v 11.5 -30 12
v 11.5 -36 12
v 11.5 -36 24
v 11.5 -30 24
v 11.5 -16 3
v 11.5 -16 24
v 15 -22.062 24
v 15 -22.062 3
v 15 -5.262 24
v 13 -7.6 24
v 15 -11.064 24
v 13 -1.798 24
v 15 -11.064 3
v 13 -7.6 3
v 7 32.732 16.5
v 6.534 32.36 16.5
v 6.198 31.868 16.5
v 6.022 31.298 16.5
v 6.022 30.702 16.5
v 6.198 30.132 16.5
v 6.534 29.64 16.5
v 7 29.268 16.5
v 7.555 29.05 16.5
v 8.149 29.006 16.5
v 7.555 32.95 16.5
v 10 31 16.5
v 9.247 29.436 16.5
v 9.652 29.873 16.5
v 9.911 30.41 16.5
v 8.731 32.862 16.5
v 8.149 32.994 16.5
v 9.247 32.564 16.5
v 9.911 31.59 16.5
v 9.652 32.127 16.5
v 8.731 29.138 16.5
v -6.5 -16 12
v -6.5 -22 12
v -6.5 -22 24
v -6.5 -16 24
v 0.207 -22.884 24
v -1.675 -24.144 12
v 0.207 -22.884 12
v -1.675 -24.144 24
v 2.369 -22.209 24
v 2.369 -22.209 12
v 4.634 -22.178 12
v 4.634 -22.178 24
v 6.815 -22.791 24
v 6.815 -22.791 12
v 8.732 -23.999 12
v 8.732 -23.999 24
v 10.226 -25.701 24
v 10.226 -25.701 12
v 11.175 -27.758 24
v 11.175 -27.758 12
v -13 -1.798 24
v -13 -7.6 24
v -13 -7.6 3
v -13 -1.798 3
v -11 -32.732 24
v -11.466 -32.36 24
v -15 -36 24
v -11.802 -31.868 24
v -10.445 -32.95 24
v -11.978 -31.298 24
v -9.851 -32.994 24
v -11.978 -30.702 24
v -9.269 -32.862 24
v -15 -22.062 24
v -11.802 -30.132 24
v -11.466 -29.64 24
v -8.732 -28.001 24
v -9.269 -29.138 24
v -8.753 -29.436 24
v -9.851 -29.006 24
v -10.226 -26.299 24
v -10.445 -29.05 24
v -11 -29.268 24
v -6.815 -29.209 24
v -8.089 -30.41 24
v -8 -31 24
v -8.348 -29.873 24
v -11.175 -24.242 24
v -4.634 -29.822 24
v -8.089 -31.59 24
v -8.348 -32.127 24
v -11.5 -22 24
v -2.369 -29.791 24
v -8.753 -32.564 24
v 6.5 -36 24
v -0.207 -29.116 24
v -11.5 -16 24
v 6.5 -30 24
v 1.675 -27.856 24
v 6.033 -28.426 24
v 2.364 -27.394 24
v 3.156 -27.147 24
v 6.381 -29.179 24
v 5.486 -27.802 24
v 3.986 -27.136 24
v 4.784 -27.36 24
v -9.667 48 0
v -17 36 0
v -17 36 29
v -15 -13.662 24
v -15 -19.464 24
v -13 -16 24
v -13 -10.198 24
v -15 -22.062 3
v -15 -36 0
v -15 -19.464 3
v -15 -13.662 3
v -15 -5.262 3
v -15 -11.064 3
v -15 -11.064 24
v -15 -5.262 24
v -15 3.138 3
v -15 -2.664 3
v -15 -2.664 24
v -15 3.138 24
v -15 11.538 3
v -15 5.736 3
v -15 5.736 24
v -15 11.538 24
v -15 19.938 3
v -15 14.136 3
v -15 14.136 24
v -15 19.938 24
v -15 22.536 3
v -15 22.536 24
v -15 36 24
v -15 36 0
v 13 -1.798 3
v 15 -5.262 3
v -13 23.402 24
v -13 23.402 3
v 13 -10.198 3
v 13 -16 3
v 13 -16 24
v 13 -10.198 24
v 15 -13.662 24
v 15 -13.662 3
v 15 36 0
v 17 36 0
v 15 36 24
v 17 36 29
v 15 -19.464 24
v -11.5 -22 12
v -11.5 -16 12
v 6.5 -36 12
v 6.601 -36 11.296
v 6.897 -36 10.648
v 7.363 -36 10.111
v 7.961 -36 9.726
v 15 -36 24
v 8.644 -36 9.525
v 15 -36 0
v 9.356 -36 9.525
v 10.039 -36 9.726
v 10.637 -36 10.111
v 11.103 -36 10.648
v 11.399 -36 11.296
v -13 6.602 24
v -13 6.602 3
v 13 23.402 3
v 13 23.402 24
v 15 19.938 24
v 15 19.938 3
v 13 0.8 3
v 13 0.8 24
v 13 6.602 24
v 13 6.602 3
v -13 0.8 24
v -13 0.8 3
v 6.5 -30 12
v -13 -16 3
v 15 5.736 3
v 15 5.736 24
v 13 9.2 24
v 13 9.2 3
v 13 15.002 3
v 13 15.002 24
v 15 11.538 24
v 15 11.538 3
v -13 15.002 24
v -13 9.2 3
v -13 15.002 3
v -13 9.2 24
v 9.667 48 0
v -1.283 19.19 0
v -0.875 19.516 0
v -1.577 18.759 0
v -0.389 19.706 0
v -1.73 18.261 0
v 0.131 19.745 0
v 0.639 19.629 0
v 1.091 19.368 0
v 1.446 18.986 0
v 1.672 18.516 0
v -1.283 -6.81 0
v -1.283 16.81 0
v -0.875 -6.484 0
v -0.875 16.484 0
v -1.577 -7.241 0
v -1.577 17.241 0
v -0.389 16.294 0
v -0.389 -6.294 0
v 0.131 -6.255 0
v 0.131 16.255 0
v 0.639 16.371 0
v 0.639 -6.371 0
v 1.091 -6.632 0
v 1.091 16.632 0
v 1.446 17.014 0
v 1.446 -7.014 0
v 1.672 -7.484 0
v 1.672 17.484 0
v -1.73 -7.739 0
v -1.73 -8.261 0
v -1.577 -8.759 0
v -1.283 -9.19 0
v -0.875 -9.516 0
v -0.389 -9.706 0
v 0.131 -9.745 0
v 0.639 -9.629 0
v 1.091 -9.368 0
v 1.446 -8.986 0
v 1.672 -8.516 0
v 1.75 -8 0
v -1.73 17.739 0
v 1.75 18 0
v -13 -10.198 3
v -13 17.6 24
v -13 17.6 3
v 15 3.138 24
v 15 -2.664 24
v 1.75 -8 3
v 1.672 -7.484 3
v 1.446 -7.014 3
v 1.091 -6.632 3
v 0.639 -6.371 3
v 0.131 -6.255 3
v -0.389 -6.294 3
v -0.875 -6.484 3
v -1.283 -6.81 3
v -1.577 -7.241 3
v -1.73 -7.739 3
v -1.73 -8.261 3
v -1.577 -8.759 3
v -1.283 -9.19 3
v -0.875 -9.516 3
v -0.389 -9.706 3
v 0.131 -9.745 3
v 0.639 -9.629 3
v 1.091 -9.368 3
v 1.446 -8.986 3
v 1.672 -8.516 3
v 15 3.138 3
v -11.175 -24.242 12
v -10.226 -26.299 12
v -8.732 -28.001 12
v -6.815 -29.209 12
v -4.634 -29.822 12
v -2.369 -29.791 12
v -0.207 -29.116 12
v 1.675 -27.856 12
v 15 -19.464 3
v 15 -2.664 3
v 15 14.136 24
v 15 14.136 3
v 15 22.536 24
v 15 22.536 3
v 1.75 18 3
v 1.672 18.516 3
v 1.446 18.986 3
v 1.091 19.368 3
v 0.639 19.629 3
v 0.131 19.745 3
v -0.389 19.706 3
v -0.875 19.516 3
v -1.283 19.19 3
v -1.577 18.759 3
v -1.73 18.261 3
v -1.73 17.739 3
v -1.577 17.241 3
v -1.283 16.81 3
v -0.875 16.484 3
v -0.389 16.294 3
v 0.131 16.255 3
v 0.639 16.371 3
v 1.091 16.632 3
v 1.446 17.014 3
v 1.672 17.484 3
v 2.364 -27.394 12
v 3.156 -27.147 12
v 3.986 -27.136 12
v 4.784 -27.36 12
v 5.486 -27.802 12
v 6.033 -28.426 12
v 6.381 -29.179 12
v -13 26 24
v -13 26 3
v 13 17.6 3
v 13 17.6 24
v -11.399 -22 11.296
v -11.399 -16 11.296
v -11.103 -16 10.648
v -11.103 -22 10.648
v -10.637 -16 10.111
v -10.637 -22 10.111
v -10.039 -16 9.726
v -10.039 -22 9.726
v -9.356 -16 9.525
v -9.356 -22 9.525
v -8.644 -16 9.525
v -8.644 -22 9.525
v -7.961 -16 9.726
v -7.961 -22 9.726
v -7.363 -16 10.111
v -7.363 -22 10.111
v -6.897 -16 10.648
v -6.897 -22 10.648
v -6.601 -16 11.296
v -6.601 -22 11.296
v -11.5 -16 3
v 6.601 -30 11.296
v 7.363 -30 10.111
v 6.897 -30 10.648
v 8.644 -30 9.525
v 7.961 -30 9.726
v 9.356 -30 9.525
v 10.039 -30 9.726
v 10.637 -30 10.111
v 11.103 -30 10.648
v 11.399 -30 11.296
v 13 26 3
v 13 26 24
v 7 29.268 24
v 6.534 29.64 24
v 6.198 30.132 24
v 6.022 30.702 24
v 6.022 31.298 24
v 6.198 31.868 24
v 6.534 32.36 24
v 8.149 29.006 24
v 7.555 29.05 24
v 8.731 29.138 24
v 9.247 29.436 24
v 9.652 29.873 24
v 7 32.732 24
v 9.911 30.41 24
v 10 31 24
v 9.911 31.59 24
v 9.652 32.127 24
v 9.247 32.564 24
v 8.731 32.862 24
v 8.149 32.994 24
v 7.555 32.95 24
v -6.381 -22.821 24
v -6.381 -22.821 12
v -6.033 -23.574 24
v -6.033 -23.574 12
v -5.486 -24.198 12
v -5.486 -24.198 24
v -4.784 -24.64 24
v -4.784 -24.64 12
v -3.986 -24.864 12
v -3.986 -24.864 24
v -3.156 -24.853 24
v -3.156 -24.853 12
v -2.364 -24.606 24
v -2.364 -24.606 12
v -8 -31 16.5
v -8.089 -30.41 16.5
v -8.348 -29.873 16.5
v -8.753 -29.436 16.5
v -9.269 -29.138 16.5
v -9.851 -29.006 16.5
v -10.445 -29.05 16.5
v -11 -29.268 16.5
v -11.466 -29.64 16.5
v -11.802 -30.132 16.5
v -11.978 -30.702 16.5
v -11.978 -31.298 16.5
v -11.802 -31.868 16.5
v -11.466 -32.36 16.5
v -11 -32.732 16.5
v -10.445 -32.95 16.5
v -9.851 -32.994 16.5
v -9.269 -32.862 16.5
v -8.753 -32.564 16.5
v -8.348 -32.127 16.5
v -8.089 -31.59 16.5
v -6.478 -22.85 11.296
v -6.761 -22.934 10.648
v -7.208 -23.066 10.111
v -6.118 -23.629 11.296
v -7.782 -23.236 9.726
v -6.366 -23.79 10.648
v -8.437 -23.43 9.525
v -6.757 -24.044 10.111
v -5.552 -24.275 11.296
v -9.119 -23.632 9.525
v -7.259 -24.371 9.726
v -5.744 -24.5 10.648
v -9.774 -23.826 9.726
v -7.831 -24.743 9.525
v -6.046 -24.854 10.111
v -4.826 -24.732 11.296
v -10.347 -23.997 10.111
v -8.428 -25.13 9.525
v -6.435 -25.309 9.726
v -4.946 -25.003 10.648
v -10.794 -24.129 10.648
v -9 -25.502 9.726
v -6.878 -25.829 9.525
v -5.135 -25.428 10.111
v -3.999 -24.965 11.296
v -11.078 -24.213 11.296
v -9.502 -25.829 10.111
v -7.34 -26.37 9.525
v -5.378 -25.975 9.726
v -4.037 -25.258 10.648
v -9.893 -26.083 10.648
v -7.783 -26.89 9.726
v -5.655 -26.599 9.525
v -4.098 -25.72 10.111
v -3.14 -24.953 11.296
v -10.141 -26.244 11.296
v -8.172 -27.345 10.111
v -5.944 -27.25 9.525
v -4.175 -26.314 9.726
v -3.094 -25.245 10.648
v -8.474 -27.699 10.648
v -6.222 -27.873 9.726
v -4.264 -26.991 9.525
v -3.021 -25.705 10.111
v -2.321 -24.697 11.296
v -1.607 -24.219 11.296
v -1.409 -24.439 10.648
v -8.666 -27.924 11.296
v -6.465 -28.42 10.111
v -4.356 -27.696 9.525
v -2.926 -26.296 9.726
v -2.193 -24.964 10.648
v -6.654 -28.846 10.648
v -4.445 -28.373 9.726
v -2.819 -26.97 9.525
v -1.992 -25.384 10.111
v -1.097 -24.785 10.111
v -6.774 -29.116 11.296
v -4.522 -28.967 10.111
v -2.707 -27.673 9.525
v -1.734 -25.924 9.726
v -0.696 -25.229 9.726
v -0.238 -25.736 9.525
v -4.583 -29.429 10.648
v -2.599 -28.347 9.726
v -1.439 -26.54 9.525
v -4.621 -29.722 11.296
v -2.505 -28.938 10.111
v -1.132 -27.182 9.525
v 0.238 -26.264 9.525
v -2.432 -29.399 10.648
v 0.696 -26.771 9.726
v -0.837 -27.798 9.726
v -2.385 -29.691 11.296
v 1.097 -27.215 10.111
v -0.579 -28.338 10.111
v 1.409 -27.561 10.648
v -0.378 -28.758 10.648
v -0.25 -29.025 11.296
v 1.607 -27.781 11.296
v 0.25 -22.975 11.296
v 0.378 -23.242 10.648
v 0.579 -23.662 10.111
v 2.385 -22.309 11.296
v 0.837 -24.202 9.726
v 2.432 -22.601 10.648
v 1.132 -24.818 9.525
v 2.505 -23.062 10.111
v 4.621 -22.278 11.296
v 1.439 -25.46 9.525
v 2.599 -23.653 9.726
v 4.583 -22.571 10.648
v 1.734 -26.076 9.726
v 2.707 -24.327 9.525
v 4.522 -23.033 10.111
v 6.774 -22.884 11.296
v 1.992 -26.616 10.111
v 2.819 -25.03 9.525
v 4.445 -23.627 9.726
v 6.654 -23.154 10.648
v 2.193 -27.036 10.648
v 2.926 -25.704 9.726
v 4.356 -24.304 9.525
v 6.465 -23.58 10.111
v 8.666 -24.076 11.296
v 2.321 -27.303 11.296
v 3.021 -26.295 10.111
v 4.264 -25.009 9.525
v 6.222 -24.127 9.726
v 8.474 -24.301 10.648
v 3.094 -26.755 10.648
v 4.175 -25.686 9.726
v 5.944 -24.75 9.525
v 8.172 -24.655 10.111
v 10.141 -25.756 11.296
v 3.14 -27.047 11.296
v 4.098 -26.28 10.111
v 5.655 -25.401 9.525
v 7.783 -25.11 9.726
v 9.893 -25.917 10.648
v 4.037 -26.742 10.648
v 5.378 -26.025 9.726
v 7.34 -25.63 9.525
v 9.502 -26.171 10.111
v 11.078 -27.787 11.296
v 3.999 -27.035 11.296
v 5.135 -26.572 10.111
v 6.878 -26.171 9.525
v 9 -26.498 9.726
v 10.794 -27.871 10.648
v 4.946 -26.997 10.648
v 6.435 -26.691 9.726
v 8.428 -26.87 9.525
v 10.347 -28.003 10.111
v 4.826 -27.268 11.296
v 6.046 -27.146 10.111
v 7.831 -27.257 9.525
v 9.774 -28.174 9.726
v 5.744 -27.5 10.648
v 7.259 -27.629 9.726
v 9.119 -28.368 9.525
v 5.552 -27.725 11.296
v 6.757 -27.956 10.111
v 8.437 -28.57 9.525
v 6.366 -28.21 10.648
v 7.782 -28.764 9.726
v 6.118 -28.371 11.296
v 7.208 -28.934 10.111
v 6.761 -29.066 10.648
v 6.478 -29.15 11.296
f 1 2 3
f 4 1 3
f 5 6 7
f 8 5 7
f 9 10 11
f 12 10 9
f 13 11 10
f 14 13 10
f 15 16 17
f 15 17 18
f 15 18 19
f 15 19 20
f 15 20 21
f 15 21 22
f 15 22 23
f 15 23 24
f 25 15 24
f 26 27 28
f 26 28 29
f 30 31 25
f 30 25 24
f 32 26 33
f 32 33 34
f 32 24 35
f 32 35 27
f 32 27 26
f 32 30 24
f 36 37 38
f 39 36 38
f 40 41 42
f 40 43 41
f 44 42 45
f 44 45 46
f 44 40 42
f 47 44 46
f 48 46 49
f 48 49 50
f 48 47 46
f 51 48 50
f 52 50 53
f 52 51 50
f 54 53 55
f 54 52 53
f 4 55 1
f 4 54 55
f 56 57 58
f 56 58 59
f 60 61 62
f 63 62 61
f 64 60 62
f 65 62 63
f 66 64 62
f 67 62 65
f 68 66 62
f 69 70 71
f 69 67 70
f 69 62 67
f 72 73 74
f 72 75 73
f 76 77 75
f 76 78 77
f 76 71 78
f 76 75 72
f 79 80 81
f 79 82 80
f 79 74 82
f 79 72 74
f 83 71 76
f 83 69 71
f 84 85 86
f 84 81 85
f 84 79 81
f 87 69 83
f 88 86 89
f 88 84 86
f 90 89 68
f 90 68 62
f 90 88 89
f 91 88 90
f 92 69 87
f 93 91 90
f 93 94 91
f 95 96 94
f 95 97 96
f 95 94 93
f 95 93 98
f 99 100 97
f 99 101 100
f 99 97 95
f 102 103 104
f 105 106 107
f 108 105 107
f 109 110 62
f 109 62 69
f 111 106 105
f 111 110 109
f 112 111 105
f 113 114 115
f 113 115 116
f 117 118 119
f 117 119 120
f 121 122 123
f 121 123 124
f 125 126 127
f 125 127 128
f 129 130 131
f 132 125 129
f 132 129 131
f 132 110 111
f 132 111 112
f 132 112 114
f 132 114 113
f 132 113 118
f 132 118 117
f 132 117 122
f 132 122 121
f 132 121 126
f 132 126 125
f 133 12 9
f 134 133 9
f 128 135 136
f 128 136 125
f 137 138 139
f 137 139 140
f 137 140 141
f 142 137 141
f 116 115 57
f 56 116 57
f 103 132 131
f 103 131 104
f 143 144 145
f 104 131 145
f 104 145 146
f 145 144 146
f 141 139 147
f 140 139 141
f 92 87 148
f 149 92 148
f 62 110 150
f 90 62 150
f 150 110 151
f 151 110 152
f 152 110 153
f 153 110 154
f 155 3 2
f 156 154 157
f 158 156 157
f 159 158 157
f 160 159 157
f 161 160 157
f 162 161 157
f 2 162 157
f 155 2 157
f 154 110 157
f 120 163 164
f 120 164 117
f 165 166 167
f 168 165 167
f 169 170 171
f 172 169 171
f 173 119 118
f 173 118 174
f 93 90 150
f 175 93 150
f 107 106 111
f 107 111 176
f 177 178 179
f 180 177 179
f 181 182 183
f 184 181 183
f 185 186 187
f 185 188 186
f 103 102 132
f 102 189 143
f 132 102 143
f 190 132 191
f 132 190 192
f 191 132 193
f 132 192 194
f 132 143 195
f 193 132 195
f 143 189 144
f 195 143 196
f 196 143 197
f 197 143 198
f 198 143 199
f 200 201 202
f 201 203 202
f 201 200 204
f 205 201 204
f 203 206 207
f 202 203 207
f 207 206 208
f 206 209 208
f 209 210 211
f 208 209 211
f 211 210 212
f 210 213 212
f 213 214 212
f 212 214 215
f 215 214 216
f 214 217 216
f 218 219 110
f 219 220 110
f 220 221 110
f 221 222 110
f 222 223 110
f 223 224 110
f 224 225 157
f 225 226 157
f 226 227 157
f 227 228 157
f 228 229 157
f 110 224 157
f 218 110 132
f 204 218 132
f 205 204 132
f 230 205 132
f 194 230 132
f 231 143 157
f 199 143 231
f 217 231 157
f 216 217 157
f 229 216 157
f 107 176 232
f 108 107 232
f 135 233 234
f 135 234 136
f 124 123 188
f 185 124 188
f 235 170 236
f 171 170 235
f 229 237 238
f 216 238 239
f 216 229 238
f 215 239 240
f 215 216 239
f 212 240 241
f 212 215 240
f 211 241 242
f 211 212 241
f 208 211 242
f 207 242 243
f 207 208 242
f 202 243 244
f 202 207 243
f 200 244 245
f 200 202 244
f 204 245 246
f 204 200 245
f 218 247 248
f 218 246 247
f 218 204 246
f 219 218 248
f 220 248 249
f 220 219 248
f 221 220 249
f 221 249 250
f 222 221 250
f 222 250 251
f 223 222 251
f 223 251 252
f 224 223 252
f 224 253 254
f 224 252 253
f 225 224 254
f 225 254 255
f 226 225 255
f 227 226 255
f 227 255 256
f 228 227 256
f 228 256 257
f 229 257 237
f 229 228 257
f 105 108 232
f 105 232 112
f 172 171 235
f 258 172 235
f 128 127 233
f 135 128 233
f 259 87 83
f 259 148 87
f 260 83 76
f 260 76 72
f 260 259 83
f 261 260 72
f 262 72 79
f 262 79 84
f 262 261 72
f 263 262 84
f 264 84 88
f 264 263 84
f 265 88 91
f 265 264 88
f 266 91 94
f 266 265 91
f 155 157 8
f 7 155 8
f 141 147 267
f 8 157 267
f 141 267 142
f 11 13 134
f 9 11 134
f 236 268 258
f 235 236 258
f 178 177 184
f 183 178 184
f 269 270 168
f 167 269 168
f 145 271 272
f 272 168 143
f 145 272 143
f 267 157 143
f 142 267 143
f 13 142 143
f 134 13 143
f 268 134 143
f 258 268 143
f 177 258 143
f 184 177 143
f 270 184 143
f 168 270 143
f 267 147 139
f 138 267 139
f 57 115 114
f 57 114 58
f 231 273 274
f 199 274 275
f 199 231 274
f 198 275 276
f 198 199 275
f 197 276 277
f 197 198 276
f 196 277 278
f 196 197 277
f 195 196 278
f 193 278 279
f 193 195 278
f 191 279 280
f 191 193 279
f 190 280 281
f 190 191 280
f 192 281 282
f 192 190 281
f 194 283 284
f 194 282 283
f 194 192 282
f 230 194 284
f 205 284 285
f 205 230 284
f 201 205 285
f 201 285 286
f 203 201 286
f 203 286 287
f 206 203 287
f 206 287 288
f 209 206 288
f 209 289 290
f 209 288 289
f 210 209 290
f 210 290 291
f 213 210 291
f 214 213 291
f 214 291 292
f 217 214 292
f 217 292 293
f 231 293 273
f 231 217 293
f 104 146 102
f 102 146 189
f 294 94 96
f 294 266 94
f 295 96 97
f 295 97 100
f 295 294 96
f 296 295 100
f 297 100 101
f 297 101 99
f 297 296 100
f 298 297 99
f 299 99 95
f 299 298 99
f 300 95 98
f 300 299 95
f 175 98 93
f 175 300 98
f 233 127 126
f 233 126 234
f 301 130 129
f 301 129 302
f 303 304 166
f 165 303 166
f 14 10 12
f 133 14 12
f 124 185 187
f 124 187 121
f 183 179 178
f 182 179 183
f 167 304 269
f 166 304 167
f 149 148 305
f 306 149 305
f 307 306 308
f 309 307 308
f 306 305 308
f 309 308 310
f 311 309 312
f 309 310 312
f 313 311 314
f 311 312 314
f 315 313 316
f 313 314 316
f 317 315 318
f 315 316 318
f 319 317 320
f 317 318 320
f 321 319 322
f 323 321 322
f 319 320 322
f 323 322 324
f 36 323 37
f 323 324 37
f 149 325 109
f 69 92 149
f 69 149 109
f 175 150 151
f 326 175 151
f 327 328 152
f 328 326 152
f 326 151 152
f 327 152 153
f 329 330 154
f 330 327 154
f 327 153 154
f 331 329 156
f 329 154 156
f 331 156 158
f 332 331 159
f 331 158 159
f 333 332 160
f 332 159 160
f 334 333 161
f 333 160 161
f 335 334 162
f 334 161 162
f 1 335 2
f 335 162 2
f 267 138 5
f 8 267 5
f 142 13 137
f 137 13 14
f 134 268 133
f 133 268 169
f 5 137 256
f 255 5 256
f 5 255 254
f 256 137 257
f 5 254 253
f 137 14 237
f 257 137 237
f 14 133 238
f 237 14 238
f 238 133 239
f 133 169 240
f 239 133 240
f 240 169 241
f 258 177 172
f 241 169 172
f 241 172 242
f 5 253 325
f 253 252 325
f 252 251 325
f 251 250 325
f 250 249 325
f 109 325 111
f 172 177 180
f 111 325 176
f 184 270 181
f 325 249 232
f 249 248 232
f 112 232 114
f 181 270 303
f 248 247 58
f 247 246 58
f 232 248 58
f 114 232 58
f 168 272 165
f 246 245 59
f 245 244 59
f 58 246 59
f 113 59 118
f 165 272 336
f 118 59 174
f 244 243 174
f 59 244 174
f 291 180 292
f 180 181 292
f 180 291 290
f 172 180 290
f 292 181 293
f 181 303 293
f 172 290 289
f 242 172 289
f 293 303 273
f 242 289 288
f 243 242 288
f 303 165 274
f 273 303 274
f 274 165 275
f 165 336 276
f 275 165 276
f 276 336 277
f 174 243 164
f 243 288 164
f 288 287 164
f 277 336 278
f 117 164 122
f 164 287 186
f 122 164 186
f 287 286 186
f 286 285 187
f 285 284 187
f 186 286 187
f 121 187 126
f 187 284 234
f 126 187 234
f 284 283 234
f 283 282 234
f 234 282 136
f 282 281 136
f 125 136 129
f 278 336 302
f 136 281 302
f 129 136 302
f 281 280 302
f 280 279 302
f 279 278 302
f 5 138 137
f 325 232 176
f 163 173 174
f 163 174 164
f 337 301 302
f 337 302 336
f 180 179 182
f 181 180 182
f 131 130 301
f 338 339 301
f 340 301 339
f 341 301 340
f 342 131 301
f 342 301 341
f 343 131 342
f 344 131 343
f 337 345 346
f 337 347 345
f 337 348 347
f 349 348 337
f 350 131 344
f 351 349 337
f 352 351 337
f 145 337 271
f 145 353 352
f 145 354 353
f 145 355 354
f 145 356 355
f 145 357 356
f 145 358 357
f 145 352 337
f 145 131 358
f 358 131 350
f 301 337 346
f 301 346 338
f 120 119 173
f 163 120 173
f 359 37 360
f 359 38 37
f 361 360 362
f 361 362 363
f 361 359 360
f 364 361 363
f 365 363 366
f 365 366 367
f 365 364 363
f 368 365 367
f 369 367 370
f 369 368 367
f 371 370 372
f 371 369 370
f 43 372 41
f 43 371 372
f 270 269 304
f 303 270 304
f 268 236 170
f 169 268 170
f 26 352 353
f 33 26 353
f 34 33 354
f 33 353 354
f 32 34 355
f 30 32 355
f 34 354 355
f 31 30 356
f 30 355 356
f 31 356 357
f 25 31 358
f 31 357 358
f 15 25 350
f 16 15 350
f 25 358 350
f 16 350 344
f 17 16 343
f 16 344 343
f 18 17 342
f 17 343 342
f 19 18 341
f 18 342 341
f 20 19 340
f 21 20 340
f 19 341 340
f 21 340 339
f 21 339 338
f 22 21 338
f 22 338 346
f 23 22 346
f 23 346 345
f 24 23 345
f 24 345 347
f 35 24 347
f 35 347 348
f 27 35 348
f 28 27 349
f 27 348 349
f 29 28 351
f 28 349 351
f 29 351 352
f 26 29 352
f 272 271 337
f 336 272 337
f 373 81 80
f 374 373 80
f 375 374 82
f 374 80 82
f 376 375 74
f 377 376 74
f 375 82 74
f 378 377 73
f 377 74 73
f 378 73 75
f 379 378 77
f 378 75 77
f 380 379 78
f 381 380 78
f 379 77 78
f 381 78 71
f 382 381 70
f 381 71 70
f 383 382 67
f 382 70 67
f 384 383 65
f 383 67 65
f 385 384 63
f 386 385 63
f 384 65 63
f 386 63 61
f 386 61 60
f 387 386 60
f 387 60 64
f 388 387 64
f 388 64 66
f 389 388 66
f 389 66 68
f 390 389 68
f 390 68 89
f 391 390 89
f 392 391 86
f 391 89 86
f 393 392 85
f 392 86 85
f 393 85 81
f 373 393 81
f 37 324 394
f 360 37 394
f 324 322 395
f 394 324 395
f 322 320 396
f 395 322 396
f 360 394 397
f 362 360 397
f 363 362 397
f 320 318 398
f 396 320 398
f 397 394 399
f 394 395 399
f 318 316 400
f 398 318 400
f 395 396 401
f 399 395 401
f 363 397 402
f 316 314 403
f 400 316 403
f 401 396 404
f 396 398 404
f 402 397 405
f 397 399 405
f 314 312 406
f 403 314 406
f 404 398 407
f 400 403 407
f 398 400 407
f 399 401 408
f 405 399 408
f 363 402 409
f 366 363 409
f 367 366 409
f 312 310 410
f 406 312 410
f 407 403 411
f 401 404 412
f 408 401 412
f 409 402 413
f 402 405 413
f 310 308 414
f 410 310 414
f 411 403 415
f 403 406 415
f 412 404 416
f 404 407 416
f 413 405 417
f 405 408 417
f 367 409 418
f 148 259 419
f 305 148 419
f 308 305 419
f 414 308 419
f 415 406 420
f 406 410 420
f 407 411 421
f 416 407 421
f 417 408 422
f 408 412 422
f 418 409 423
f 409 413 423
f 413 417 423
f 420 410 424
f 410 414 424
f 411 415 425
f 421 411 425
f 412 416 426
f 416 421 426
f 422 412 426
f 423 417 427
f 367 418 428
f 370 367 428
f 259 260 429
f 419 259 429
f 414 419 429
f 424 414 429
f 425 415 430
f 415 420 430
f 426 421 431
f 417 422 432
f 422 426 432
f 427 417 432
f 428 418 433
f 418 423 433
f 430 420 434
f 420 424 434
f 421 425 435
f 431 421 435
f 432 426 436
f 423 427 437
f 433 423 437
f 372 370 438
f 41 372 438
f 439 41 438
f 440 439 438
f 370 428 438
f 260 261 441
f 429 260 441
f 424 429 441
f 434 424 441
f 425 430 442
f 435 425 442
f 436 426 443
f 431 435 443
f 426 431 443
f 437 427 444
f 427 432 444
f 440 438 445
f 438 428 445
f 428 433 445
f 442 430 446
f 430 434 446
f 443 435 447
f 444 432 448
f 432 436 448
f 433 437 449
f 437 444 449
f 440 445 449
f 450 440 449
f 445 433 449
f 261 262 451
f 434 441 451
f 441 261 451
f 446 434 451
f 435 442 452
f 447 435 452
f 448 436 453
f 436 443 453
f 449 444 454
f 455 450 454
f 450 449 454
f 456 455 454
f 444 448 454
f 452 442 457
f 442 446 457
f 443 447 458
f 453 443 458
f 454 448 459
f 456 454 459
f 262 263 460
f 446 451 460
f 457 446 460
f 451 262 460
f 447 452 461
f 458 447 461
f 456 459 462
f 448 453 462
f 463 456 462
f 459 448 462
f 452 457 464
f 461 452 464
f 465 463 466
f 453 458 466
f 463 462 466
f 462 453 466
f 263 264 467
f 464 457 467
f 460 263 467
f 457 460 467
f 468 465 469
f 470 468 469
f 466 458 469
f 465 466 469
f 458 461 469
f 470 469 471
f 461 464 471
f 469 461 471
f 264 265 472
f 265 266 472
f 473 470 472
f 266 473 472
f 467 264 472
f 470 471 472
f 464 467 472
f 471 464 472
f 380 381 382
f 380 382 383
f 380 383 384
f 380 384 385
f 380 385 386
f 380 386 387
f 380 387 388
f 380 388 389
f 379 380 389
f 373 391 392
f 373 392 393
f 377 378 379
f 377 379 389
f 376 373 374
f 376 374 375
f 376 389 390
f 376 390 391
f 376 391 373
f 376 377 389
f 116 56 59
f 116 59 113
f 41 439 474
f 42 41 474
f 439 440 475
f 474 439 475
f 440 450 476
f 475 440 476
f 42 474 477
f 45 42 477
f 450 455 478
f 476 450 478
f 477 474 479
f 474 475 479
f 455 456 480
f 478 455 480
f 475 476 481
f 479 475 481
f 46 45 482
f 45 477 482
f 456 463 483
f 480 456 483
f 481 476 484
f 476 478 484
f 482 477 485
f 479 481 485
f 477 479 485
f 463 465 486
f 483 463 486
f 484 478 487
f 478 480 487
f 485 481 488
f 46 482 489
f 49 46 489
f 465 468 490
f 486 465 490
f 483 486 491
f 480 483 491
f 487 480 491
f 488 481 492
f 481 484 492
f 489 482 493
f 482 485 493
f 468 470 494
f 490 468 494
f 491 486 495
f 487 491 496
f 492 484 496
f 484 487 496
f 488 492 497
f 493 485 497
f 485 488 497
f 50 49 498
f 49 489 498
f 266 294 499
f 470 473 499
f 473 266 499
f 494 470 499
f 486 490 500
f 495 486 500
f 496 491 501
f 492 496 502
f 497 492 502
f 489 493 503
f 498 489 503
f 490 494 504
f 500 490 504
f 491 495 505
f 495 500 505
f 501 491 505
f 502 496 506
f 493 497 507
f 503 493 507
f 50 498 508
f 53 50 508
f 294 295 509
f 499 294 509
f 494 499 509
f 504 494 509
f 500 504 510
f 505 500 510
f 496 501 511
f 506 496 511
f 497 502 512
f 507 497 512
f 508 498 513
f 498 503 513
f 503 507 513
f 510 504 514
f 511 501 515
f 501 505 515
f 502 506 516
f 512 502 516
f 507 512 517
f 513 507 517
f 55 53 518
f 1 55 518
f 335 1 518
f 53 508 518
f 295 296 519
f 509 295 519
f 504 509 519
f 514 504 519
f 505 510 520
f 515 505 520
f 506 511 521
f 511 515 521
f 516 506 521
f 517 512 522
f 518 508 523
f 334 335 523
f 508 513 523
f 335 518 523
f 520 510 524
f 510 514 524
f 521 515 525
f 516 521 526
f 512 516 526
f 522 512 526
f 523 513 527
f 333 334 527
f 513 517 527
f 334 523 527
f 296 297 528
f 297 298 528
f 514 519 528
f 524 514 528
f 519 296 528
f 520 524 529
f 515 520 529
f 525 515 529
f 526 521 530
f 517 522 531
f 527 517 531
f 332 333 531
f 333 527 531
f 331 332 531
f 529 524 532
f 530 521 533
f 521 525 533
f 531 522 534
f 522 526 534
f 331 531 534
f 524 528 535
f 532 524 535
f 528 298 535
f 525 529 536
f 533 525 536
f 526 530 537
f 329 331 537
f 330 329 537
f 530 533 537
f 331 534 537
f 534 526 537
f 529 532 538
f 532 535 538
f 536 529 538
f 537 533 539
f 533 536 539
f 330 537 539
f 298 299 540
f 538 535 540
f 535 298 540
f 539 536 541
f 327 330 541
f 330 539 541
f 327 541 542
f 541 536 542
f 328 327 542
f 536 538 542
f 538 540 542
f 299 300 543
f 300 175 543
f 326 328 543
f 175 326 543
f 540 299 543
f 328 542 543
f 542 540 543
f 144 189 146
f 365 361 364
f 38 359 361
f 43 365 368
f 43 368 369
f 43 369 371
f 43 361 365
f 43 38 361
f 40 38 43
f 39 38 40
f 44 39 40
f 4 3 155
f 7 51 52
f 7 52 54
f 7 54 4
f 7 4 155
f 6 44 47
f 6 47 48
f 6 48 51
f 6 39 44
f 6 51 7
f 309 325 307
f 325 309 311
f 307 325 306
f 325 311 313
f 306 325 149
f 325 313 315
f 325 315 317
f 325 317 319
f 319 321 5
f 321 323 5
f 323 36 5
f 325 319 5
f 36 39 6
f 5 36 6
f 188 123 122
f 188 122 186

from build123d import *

# Parameters (mm, degrees)
SKETCH_W                        = 30
SKETCH_H                        = 72
SKETCH_R                        = 1.75
PAD_DEPTH                       = 24
SKETCH001_W                     = 26
SKETCH001_H                     = 42
POCKET_DEPTH                    = 21
POCKET001_DEPTH                 = 21
POCKET001_LINEARPATTERN_2_DEPTH = 21
POCKET001_LINEARPATTERN_3_DEPTH = 21
POCKET001_LINEARPATTERN_4_DEPTH = 21
POCKET001_LINEARPATTERN_5_DEPTH = 21
POCKET001_LINEARPATTERN_6_DEPTH = 21
SKETCH005_R                     = 2
POCKET002_DEPTH                 = 7.5
PAD003_DEPTH                    = 17
PAD003_DEPTH_BACK               = 17
POCKET004_DEPTH                 = 29.001


with BuildPart() as part:
    # Sketch → Pad (new body)
    with BuildSketch(Plane.XY):
        Rectangle(SKETCH_W, SKETCH_H)
        with Locations((0, 18)):
            Circle(SKETCH_R, mode=Mode.SUBTRACT)
        with Locations((0, -8)):
            Circle(SKETCH_R, mode=Mode.SUBTRACT)
    extrude(amount=PAD_DEPTH)

    # Sketch001 → Pocket (cut)
    with BuildSketch(Plane.XY.offset(24)):
        with Locations((0, 5)):
            Rectangle(SKETCH001_W, SKETCH001_H)
    extrude(amount=-POCKET_DEPTH, mode=Mode.SUBTRACT)

    # Sketch002 → Pocket001 (cut)
    with BuildSketch(Plane.XY.offset(24)):
        Polygon((-18.773503, 16), (-13, 26), (-11.5, 26), (-17.273503, 16), align=None)
    pocket001 = extrude(amount=-POCKET001_DEPTH, mode=Mode.SUBTRACT)

    # Sketch002 LinearPattern 2 → Pocket001 LinearPattern 2 (cut)
    with BuildSketch(Plane(origin=(0, -8.4, 24), x_dir=(1, 0, 0), z_dir=(0, 0, 1))):
        Polygon((-18.773503, 16), (-13, 26), (-11.5, 26), (-17.273503, 16), align=None)
    pocket001_linearpattern_2 = extrude(amount=-POCKET001_LINEARPATTERN_2_DEPTH, mode=Mode.SUBTRACT)

    # Sketch002 LinearPattern 3 → Pocket001 LinearPattern 3 (cut)
    with BuildSketch(Plane(origin=(0, -16.8, 24), x_dir=(1, 0, 0), z_dir=(0, 0, 1))):
        Polygon((-18.773503, 16), (-13, 26), (-11.5, 26), (-17.273503, 16), align=None)
    pocket001_linearpattern_3 = extrude(amount=-POCKET001_LINEARPATTERN_3_DEPTH, mode=Mode.SUBTRACT)

    # Sketch002 LinearPattern 4 → Pocket001 LinearPattern 4 (cut)
    with BuildSketch(Plane(origin=(0, -25.2, 24), x_dir=(1, 0, 0), z_dir=(0, 0, 1))):
        Polygon((-18.773503, 16), (-13, 26), (-11.5, 26), (-17.273503, 16), align=None)
    pocket001_linearpattern_4 = extrude(amount=-POCKET001_LINEARPATTERN_4_DEPTH, mode=Mode.SUBTRACT)

    # Sketch002 LinearPattern 5 → Pocket001 LinearPattern 5 (cut)
    with BuildSketch(Plane(origin=(0, -33.6, 24), x_dir=(1, 0, 0), z_dir=(0, 0, 1))):
        Polygon((-18.773503, 16), (-13, 26), (-11.5, 26), (-17.273503, 16), align=None)
    pocket001_linearpattern_5 = extrude(amount=-POCKET001_LINEARPATTERN_5_DEPTH, mode=Mode.SUBTRACT)

    # Sketch002 LinearPattern 6 → Pocket001 LinearPattern 6 (cut)
    with BuildSketch(Plane(origin=(0, -42, 24), x_dir=(1, 0, 0), z_dir=(0, 0, 1))):
        Polygon((-18.773503, 16), (-13, 26), (-11.5, 26), (-17.273503, 16), align=None)
    pocket001_linearpattern_6 = extrude(amount=-POCKET001_LINEARPATTERN_6_DEPTH, mode=Mode.SUBTRACT)

    # Mirrored: Pocket001, Pocket001 LinearPattern 2, Pocket001 LinearPattern 3, Pocket001 LinearPattern 4, Pocket001 LinearPattern 5, Pocket001 LinearPattern 6 across Sketch002 V_Axis
    add(pocket001.mirror(Plane(origin=(0, 0, 24), x_dir=(0, 0, 1), z_dir=(1, 0, 0))), mode=Mode.SUBTRACT)
    add(pocket001_linearpattern_2.mirror(Plane(origin=(0, 0, 24), x_dir=(0, 0, 1), z_dir=(1, 0, 0))), mode=Mode.SUBTRACT)
    add(pocket001_linearpattern_3.mirror(Plane(origin=(0, 0, 24), x_dir=(0, 0, 1), z_dir=(1, 0, 0))), mode=Mode.SUBTRACT)
    add(pocket001_linearpattern_4.mirror(Plane(origin=(0, 0, 24), x_dir=(0, 0, 1), z_dir=(1, 0, 0))), mode=Mode.SUBTRACT)
    add(pocket001_linearpattern_5.mirror(Plane(origin=(0, 0, 24), x_dir=(0, 0, 1), z_dir=(1, 0, 0))), mode=Mode.SUBTRACT)
    add(pocket001_linearpattern_6.mirror(Plane(origin=(0, 0, 24), x_dir=(0, 0, 1), z_dir=(1, 0, 0))), mode=Mode.SUBTRACT)

    # SubtractivePipe: sweep along a path in Sketch003
    with BuildLine(Plane.XY.offset(24)) as subtractivepipe_path:
        Line((-9, -16), (-9, -22))
        ThreePointArc((-9, -22), (-5.799746, -26.924429), (0, -26))
        ThreePointArc((0, -26), (5.799746, -25.075571), (9, -30))
        Line((9, -30), (9, -36))
    # Sketch004 → SubtractivePipe (sweep, cut)
    with BuildSketch(Plane.XZ.offset(36)):
        with BuildLine():
            Line((6.5, 24), (6.5, 12))
            ThreePointArc((6.5, 12), (9, 9.5), (11.5, 12))
            Line((11.5, 12), (11.5, 24))
            Line((11.5, 24), (6.5, 24))
        make_face()
    sweep(path=subtractivepipe_path.line, mode=Mode.SUBTRACT)

    # Sketch005 → Pocket002 (cut)
    with BuildSketch(Plane.XY.offset(24)):
        with Locations((-10, -31)):
            Circle(SKETCH005_R)
        with Locations((8, 31)):
            Circle(SKETCH005_R)
    extrude(amount=-POCKET002_DEPTH, mode=Mode.SUBTRACT)

    # Sketch010 → Pad003 (join, two sides)
    with BuildSketch(Plane(origin=(0, 36, 0), x_dir=(0, 1, 0), z_dir=(1, 0, 0))) as pad003_sk:
        Polygon((0, 0), (0, 29), (12, 0), align=None)
    extrude(amount=PAD003_DEPTH)
    extrude(pad003_sk.sketch, amount=-PAD003_DEPTH_BACK)

    # Sketch011 → Pocket004 (cut, through all)
    with BuildSketch(Plane.XY):
        Polygon((-17, 36), (-6, 54), (6, 54), (17, 36), (17, 56), (-17, 56), align=None)
    extrude(amount=POCKET004_DEPTH, mode=Mode.SUBTRACT)


solid = part.part
